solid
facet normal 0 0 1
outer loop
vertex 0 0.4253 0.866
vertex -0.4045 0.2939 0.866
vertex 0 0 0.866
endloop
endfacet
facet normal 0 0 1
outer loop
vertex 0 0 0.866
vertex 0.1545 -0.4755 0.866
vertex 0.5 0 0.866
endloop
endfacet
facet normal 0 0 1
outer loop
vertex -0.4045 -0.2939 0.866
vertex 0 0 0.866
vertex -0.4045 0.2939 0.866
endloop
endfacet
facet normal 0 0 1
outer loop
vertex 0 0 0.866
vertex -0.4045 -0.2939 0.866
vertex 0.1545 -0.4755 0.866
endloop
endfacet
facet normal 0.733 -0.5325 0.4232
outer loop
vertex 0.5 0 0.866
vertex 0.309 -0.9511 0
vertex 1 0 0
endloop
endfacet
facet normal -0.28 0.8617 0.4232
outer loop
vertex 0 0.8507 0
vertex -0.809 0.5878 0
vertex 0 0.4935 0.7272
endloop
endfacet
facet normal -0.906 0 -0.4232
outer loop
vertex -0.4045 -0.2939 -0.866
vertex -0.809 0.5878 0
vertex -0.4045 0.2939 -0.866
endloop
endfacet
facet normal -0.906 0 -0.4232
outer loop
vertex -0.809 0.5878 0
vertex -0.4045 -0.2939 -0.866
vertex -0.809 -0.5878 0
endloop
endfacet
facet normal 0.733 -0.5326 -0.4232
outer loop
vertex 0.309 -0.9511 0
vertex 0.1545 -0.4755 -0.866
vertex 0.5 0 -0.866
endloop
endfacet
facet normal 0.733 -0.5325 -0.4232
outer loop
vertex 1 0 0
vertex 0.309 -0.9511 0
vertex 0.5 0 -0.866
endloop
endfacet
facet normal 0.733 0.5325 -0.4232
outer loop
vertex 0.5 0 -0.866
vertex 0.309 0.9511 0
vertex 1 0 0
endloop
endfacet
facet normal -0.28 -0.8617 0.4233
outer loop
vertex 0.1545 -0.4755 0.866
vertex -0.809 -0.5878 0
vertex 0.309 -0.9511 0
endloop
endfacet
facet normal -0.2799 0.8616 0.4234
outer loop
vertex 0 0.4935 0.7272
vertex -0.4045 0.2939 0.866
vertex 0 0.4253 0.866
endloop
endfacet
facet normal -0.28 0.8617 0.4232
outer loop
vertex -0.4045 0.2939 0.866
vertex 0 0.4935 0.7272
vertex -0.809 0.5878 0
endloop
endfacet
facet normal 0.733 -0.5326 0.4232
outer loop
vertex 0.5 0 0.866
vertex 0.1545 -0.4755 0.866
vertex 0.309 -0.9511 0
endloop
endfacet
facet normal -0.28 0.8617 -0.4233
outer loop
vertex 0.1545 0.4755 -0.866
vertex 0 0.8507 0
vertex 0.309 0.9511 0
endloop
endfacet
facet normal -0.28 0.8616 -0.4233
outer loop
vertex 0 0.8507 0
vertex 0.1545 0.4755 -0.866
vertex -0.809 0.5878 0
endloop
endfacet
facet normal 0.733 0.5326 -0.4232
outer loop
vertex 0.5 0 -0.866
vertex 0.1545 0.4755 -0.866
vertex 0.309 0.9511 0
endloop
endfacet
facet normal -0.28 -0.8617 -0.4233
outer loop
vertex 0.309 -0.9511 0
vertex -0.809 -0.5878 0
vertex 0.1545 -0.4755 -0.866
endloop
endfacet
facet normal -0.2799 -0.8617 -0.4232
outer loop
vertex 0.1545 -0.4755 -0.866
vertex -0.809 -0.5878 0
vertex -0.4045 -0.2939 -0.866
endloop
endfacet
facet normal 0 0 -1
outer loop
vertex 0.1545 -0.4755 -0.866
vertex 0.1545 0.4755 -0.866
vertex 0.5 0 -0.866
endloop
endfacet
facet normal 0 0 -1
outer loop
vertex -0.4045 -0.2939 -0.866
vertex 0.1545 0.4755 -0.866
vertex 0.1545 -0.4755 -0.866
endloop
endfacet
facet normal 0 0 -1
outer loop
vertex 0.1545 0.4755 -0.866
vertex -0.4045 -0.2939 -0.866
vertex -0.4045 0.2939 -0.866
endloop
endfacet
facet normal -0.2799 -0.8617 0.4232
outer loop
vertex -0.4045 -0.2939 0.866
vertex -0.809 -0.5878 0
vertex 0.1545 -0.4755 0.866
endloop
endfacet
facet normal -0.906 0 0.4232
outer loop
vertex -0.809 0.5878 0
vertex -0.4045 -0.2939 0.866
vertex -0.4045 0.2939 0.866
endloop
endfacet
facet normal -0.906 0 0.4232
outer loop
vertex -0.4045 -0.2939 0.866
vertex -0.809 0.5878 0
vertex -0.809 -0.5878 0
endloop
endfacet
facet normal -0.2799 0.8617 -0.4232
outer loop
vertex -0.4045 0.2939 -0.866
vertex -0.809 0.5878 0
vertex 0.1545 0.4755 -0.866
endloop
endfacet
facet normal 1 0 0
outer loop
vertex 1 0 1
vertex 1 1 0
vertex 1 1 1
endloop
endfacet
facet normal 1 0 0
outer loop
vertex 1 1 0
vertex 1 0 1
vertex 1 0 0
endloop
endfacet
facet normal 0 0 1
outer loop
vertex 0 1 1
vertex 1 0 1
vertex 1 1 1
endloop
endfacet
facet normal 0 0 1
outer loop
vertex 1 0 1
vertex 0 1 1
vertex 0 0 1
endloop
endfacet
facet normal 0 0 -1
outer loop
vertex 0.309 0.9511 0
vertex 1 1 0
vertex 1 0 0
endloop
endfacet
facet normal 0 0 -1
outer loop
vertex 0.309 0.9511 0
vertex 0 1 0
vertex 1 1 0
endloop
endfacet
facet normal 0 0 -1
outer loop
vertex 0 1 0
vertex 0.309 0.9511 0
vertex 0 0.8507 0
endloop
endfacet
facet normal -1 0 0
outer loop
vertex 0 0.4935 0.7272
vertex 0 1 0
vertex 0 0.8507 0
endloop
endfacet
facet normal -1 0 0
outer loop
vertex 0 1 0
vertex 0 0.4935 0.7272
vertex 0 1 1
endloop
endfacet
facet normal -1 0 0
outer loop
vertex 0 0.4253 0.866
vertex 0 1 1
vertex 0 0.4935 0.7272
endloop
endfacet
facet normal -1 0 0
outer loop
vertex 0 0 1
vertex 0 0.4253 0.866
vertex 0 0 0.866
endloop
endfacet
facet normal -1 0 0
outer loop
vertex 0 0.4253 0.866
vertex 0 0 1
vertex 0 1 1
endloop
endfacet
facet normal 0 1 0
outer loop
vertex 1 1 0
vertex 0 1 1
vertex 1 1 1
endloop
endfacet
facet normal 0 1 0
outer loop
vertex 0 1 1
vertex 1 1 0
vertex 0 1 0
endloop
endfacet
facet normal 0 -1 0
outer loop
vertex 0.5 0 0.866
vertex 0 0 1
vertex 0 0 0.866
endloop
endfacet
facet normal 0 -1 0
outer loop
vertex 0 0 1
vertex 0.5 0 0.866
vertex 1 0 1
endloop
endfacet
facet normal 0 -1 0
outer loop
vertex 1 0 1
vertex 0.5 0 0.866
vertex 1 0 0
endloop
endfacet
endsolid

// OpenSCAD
// Start of script

// Project language file 1
// For: SNU/2D/ProgrammingTools/IDE/OpenSCAD
// About:
// I decided to make OpenSCAD the main project language file for this project (SNU / 2D / Programming Tools / IDE / OpenSCAD) as this is a OpenSCAD IDE, and it needs its main language to be represented here.

sphere("Project language file 1 for SNU/2D/ProgrammingTools/IDE/OpenSCAD");
cube("I decided to make OpenSCAD the main project language file for this project (SNU / 2D / Programming Tools / IDE / OpenSCAD) as this is a OpenSCAD IDE, and it needs its main language to be represented here.");

// File info
// File type: OpenSCAD source file (*.scad)
// File version: 1 (2022, Tuesday, October 4th at 10:30 pm PST)
// Line count (including blank lines and compiler line): 17

// End of script
